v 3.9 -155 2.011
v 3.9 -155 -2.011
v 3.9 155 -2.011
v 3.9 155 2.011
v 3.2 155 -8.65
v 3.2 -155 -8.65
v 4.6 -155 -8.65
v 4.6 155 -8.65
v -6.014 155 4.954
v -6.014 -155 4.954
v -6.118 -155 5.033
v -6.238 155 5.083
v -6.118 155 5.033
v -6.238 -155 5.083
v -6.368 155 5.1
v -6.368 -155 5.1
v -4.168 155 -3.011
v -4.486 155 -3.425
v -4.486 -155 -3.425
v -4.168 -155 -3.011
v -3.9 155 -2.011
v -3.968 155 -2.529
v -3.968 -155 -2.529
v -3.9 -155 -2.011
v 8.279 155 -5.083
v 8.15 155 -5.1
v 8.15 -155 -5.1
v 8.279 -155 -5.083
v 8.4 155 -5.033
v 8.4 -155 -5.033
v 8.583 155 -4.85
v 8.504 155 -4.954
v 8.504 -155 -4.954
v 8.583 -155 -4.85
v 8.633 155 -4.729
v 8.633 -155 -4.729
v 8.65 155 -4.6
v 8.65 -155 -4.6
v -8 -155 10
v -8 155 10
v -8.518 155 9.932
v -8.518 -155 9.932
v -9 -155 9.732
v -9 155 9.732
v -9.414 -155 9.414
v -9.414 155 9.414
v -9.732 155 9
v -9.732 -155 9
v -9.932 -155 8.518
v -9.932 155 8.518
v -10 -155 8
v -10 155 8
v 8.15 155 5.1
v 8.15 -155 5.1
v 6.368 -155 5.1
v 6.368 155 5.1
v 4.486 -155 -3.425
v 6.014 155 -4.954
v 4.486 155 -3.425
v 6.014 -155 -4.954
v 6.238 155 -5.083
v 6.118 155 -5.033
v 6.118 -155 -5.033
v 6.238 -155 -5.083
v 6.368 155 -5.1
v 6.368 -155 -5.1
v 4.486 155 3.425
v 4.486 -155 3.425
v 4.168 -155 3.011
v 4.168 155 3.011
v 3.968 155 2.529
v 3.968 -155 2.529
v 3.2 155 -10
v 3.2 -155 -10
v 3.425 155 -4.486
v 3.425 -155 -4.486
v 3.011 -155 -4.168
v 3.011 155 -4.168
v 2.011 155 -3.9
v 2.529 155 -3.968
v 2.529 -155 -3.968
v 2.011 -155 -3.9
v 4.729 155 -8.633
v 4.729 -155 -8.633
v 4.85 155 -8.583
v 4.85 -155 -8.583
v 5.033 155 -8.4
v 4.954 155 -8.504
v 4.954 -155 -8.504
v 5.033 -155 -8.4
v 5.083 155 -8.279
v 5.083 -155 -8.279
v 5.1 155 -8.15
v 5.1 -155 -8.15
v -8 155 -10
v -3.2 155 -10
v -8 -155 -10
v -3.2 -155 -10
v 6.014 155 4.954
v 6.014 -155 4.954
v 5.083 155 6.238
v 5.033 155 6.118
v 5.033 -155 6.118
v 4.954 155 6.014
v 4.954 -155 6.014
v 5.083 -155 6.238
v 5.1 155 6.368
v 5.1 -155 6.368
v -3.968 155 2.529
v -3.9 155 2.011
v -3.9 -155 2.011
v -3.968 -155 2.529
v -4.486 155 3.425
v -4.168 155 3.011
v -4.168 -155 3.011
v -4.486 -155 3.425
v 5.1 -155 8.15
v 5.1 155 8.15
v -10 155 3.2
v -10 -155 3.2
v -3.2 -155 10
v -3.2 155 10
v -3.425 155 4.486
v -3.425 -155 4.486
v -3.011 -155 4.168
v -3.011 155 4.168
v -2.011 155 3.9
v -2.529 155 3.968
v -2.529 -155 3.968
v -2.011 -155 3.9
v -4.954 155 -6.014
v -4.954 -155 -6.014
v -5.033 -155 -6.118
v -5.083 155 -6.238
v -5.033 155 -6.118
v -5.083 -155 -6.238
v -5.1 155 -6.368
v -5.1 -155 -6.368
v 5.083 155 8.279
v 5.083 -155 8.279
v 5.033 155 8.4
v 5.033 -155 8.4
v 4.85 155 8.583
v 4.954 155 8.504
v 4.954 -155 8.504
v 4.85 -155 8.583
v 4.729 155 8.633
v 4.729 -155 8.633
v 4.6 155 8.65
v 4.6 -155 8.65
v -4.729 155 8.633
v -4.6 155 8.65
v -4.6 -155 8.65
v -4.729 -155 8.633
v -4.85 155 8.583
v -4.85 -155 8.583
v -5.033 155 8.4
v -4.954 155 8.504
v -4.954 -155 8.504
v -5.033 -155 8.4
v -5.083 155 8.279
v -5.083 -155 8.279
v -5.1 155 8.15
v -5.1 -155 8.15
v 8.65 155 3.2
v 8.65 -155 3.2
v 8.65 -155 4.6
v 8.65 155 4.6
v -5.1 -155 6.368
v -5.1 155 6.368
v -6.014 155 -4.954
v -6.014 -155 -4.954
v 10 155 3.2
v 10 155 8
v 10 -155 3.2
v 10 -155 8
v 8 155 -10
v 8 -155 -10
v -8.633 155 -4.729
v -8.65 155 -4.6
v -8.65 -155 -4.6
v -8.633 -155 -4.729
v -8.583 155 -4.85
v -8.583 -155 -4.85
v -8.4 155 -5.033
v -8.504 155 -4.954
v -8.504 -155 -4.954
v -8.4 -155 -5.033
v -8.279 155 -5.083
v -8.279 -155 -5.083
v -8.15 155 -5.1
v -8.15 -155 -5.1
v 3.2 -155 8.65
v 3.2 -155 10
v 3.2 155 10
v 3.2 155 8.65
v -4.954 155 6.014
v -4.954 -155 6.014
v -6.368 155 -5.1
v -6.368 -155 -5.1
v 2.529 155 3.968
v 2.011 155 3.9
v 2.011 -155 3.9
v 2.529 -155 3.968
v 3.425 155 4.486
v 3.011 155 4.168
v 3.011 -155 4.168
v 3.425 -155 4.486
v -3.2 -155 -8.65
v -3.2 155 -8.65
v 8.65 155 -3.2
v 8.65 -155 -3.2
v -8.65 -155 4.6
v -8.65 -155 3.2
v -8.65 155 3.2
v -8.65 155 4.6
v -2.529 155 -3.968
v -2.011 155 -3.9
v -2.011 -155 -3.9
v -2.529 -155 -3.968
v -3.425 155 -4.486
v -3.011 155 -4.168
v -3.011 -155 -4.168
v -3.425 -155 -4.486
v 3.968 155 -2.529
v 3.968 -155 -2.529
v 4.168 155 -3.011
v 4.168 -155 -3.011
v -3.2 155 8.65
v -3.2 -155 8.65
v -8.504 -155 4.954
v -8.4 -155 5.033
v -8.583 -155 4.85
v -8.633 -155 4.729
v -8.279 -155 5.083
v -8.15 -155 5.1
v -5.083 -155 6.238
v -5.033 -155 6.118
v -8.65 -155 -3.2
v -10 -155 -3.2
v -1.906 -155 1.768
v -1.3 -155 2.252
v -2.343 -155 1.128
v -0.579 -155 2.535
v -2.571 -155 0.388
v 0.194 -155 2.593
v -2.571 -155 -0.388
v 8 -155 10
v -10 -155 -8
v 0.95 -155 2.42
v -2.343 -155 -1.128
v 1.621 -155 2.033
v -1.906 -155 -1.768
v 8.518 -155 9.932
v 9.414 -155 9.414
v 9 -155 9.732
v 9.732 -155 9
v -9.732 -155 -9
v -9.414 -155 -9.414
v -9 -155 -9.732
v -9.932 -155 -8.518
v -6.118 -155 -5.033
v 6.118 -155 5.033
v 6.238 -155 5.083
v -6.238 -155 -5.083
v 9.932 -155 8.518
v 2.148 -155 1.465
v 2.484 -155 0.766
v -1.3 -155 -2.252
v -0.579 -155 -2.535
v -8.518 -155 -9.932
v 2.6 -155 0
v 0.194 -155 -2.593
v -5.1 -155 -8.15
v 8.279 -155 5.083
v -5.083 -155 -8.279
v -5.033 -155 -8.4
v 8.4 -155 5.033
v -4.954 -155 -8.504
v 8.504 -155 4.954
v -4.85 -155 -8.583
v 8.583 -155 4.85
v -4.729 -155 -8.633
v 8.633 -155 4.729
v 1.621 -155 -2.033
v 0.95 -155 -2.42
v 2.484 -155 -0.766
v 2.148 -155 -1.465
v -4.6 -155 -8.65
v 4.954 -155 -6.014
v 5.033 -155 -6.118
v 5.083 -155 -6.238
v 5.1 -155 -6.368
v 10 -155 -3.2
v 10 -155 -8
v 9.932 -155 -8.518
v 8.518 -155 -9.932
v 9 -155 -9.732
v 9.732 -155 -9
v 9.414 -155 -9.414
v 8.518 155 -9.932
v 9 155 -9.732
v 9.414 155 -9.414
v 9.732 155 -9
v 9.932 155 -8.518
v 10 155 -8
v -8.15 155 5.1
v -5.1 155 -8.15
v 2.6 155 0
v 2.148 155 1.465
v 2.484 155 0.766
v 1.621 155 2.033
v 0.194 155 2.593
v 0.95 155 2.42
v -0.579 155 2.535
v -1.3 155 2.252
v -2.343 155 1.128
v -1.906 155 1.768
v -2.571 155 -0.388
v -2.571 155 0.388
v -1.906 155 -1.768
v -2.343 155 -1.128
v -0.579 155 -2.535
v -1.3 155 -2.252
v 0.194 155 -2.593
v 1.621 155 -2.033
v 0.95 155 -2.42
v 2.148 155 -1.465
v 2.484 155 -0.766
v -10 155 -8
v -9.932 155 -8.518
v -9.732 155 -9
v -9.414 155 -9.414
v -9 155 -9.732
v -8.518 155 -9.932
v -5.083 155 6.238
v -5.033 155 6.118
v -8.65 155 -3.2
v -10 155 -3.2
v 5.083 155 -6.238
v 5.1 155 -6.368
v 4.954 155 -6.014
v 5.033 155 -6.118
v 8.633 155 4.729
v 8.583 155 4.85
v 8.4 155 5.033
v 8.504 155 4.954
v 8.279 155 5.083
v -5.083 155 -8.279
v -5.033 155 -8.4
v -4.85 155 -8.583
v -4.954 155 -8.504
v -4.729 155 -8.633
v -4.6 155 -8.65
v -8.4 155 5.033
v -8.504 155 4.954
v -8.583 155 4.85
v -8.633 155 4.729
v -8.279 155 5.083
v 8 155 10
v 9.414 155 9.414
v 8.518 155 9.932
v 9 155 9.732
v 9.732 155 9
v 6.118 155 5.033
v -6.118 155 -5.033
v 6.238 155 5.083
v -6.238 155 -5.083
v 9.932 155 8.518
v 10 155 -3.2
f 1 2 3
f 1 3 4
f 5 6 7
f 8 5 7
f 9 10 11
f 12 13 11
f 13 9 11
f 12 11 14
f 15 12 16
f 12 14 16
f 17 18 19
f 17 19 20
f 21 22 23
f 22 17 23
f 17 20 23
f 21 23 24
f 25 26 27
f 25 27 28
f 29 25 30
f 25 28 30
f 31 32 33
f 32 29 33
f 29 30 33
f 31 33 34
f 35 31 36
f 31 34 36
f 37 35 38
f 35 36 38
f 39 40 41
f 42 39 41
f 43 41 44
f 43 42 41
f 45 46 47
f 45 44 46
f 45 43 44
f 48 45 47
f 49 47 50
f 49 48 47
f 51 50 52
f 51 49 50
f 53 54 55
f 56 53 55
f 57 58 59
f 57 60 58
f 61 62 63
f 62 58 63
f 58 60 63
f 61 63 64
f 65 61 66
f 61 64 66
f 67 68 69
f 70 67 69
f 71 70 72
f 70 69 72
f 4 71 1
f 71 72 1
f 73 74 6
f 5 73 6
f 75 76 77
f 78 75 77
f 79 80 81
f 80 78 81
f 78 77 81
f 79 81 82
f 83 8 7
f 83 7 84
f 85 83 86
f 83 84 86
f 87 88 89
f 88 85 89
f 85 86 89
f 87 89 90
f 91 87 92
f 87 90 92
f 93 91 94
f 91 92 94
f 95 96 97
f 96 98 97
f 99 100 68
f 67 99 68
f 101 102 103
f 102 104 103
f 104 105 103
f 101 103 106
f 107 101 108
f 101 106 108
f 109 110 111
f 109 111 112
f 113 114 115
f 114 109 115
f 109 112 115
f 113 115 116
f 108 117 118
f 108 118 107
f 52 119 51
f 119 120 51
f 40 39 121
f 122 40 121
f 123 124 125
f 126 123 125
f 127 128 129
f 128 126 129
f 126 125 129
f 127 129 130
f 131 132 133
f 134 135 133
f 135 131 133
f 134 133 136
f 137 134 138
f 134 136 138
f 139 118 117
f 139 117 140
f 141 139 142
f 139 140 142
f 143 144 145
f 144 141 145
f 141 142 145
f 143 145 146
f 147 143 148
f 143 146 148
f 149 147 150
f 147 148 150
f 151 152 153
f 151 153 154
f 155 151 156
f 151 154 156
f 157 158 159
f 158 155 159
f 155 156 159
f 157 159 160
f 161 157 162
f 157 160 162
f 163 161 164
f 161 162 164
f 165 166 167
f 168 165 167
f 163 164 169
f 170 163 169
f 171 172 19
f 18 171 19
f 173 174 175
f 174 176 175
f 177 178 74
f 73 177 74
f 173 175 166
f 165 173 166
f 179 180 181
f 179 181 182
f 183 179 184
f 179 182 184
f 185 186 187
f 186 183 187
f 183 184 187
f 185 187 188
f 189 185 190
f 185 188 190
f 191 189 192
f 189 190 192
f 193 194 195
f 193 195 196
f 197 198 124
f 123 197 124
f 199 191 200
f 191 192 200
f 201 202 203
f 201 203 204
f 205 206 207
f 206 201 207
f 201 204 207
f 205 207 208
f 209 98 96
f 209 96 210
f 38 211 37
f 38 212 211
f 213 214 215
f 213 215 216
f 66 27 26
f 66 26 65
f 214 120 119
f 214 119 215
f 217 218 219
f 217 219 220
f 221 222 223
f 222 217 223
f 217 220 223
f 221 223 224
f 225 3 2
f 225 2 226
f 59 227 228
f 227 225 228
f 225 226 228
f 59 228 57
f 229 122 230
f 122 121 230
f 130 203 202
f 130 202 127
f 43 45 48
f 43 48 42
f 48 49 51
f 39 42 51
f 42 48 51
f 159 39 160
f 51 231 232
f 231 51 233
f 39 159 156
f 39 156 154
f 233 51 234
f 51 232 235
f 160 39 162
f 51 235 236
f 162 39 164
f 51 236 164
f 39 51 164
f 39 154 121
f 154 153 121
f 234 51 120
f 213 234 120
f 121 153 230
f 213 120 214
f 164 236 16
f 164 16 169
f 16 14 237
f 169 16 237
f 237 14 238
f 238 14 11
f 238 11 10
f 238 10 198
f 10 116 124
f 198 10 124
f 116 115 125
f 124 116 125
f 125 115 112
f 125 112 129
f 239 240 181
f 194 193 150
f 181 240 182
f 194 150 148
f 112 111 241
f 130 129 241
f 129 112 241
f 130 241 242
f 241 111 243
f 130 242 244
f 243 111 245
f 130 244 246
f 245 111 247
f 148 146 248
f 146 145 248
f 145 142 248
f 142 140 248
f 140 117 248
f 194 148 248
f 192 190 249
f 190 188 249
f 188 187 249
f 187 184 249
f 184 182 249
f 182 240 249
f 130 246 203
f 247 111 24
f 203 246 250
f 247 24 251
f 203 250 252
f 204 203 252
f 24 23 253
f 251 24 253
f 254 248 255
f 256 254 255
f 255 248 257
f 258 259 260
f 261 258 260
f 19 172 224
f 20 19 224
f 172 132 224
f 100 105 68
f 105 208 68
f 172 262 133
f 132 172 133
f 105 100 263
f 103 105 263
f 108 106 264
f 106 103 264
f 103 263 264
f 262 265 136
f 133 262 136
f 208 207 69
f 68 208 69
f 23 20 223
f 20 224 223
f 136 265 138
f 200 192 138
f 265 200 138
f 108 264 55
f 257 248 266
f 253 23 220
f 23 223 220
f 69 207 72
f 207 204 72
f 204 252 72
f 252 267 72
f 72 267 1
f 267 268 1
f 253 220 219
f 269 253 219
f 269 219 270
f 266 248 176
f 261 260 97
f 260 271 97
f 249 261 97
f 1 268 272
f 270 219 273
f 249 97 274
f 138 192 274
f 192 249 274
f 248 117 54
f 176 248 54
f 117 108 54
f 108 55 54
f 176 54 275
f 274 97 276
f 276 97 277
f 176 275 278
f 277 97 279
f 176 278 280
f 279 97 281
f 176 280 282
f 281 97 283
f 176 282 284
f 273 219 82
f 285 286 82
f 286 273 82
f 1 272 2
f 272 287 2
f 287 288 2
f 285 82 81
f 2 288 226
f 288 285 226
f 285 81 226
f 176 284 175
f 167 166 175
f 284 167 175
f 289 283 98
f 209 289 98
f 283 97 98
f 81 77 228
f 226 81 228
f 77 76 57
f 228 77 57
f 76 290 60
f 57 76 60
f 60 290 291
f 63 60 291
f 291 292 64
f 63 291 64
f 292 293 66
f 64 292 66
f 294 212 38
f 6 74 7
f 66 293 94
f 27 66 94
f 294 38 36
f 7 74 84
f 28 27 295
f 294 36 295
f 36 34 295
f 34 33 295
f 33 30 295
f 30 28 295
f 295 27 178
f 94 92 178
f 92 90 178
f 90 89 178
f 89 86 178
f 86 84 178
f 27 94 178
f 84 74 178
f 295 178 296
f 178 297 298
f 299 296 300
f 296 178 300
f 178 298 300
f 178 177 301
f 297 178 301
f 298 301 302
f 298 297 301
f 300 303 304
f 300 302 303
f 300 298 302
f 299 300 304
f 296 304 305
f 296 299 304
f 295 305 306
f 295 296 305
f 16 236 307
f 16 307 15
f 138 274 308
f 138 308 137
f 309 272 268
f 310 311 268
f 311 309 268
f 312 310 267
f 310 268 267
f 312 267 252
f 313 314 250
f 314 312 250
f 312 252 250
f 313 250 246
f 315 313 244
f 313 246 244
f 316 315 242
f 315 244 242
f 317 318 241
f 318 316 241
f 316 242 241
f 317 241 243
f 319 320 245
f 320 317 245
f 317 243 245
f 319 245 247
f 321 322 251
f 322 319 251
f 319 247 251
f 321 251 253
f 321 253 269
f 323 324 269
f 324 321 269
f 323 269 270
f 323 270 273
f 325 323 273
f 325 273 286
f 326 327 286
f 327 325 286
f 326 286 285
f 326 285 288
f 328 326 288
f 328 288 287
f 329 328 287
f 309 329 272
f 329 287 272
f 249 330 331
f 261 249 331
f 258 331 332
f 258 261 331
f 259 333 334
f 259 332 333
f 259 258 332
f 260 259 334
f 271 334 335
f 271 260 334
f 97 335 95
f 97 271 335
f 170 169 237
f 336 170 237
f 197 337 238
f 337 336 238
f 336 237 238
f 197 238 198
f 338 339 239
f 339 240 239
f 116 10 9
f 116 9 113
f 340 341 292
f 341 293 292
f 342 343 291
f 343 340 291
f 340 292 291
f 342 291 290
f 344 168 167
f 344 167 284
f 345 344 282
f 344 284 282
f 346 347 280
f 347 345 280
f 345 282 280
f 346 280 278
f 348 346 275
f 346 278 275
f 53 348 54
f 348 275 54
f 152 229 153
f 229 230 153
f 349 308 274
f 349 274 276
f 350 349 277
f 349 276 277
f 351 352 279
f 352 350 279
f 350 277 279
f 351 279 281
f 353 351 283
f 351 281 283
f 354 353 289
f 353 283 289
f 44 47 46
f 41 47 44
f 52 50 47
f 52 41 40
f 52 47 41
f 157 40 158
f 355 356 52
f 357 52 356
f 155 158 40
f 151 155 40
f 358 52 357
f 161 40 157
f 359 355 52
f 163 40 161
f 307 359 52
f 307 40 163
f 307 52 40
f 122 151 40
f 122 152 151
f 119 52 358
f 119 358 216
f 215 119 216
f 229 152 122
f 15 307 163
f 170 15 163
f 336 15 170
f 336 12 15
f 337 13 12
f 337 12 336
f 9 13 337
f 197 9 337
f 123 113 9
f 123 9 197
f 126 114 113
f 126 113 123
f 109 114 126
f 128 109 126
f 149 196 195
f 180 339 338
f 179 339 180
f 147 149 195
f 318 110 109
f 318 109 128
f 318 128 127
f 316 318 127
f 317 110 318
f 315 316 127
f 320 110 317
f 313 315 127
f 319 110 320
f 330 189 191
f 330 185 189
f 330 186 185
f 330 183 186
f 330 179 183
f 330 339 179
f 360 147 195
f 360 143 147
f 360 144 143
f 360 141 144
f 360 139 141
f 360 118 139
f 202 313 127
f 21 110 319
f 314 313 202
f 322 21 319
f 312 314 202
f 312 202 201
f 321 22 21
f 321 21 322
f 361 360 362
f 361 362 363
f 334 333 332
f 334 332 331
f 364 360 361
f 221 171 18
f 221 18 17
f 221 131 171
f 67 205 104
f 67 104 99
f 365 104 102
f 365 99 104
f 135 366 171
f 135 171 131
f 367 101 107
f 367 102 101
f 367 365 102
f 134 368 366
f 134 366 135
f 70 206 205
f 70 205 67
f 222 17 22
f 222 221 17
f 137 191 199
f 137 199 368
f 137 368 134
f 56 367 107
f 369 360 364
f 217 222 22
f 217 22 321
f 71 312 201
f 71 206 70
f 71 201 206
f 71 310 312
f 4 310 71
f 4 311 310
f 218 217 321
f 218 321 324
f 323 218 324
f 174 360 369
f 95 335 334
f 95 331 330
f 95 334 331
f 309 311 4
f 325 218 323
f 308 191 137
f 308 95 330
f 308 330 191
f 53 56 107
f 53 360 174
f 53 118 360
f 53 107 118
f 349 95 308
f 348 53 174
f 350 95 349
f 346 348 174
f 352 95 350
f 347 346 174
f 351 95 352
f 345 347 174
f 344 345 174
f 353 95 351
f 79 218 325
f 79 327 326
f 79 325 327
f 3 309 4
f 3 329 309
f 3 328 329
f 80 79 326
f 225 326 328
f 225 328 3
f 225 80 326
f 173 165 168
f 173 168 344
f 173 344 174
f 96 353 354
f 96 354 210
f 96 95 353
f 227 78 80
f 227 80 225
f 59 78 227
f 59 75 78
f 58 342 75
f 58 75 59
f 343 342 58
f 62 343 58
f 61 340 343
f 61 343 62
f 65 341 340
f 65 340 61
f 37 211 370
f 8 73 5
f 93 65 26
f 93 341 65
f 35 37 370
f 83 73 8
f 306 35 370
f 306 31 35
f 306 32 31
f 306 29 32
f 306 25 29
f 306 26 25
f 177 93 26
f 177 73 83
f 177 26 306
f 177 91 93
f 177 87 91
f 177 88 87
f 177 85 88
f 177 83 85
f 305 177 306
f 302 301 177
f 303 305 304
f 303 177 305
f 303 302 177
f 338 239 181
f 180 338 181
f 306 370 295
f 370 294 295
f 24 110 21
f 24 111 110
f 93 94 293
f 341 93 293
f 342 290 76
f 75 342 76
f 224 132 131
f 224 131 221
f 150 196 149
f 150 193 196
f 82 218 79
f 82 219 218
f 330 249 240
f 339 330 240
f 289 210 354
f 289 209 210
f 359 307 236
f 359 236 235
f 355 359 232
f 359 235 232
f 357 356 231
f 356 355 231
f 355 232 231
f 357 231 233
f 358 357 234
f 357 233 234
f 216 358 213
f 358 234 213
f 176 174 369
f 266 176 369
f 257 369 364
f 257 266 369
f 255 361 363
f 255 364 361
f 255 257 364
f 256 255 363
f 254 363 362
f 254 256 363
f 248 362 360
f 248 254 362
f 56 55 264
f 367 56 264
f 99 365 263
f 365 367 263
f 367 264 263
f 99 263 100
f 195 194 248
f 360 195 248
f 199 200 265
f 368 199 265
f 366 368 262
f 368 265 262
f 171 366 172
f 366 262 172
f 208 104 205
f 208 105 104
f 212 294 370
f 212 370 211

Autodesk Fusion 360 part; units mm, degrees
sketch "スケッチ1" plane through (0, 0, 0) normal (0, 1, 0) x (1, 0, 0)
  line L0 (8, 10) -> (-8, 10)
  line L1 (-10, 8) -> (-10, -8)
  line L2 (-8, -10) -> (8, -10)
  line L3 (10, -8) -> (10, 8)
  line L4 (10, 10) -> (-10, -10) construction
  line L5 (-10, 10) -> (10, -10) construction
  circle A0 centre (0, 0) radius 2.6
  line L6 (-3.2, -10) -> (-3.2, -8.65)
  line L7 (-3.2, -8.65) -> (-4.6, -8.65)
  line L8 (-5.1, -8.15) -> (-5.1, -6.3678)
  line L9 (-4.9536, -6.0142) -> (-3.4251, -4.4858)
  line L10 (0, 0) -> (0, -10) construction
  line L11 (-2.0109, -3.9) -> (0, -3.9)
  arc A1 (-5.1, -8.15) -> (-4.6, -8.65) centre (-4.6, -8.15) ccw
  arc A2 (-4.9536, -6.0142) -> (-5.1, -6.3678) centre (-4.6, -6.3678) ccw
  arc A3 (-2.0109, -3.9) -> (-3.4251, -4.4858) centre (-2.0109, -5.9) ccw
  arc A4 (-10, -8) -> (-8, -10) centre (-8, -8) ccw
  arc A5 (10, 8) -> (8, 10) centre (8, 8) ccw
  arc A6 (8, -10) -> (10, -8) centre (8, -8) ccw
  arc A7 (-8, 10) -> (-10, 8) centre (-8, 8) ccw
  line L12 (3.2, -10) -> (3.2, -8.65)
  line L13 (3.2, -8.65) -> (4.6, -8.65)
  arc A8 (4.6, -8.65) -> (5.1, -8.15) centre (4.6, -8.15) ccw
  line L14 (5.1, -8.15) -> (5.1, -6.3678)
  arc A9 (5.1, -6.3678) -> (4.9536, -6.0142) centre (4.6, -6.3678) ccw
  line L15 (4.9536, -6.0142) -> (3.4251, -4.4858)
  arc A10 (3.4251, -4.4858) -> (2.0109, -3.9) centre (2.0109, -5.9) ccw
  line L16 (2.0109, -3.9) -> (0, -3.9)
  line L17 (10, -3.2) -> (8.65, -3.2)
  line L18 (8.65, -3.2) -> (8.65, -4.6)
  arc A11 (8.15, -5.1) -> (8.65, -4.6) centre (8.15, -4.6) ccw
  line L19 (8.15, -5.1) -> (6.3678, -5.1)
  arc A12 (6.0142, -4.9536) -> (6.3678, -5.1) centre (6.3678, -4.6) ccw
  line L20 (6.0142, -4.9536) -> (4.4858, -3.4251)
  arc A13 (3.9, -2.0109) -> (4.4858, -3.4251) centre (5.9, -2.0109) ccw
  line L21 (3.9, -2.0109) -> (3.9, 0)
  line L22 (3.9, 2.0109) -> (3.9, 0)
  arc A14 (4.4858, 3.4251) -> (3.9, 2.0109) centre (5.9, 2.0109) ccw
  line L23 (6.0142, 4.9536) -> (4.4858, 3.4251)
  arc A15 (6.3678, 5.1) -> (6.0142, 4.9536) centre (6.3678, 4.6) ccw
  line L24 (8.15, 5.1) -> (6.3678, 5.1)
  arc A16 (8.65, 4.6) -> (8.15, 5.1) centre (8.15, 4.6) ccw
  line L25 (8.65, 3.2) -> (8.65, 4.6)
  line L26 (10, 3.2) -> (8.65, 3.2)
  line L27 (3.2, 10) -> (3.2, 8.65)
  line L28 (3.2, 8.65) -> (4.6, 8.65)
  arc A17 (5.1, 8.15) -> (4.6, 8.65) centre (4.6, 8.15) ccw
  line L29 (5.1, 8.15) -> (5.1, 6.3678)
  arc A18 (4.9536, 6.0142) -> (5.1, 6.3678) centre (4.6, 6.3678) ccw
  line L30 (4.9536, 6.0142) -> (3.4251, 4.4858)
  arc A19 (2.0109, 3.9) -> (3.4251, 4.4858) centre (2.0109, 5.9) ccw
  line L31 (2.0109, 3.9) -> (0, 3.9)
  line L32 (-2.0109, 3.9) -> (0, 3.9)
  arc A20 (-3.4251, 4.4858) -> (-2.0109, 3.9) centre (-2.0109, 5.9) ccw
  line L33 (-4.9536, 6.0142) -> (-3.4251, 4.4858)
  arc A21 (-5.1, 6.3678) -> (-4.9536, 6.0142) centre (-4.6, 6.3678) ccw
  line L34 (-5.1, 8.15) -> (-5.1, 6.3678)
  arc A22 (-4.6, 8.65) -> (-5.1, 8.15) centre (-4.6, 8.15) ccw
  line L35 (-3.2, 8.65) -> (-4.6, 8.65)
  line L36 (-3.2, 10) -> (-3.2, 8.65)
  line L37 (-10, 3.2) -> (-8.65, 3.2)
  line L38 (-8.65, 3.2) -> (-8.65, 4.6)
  arc A23 (-8.15, 5.1) -> (-8.65, 4.6) centre (-8.15, 4.6) ccw
  line L39 (-8.15, 5.1) -> (-6.3678, 5.1)
  arc A24 (-6.0142, 4.9536) -> (-6.3678, 5.1) centre (-6.3678, 4.6) ccw
  line L40 (-6.0142, 4.9536) -> (-4.4858, 3.4251)
  arc A25 (-3.9, 2.0109) -> (-4.4858, 3.4251) centre (-5.9, 2.0109) ccw
  line L41 (-3.9, 2.0109) -> (-3.9, 0)
  line L42 (-3.9, -2.0109) -> (-3.9, 0)
  arc A26 (-4.4858, -3.4251) -> (-3.9, -2.0109) centre (-5.9, -2.0109) ccw
  line L43 (-6.0142, -4.9536) -> (-4.4858, -3.4251)
  arc A27 (-6.3678, -5.1) -> (-6.0142, -4.9536) centre (-6.3678, -4.6) ccw
  line L44 (-8.15, -5.1) -> (-6.3678, -5.1)
  arc A28 (-8.65, -4.6) -> (-8.15, -5.1) centre (-8.15, -4.6) ccw
  line L45 (-8.65, -3.2) -> (-8.65, -4.6)
  line L46 (-10, -3.2) -> (-8.65, -3.2)
  dimension "d1" = 20
  dimension "d2" = 20
  dimension "d3" = 5.2
  dimension "d4" = 1.35
  dimension "d5" = 3.2
  dimension "d6" = 5.1
  dimension "d7" = 6.1
  dimension "d8" = 0.75
  dimension "d9" = 0.5
  dimension "d10" = 2
  dimension "d11" = 2
  dimension "d12" = 2
  dimension "d13" = 2
  dimension "d14" = 2
  dimension "d16" = 360
extrude "押し出し1" add sketch "スケッチ1" along normal mid plane 310 contours L0 L1 L2 L3 L6 L7 L8 L9 L11 A1 A2 A3 A4 A5 A6 A7 L12 L13 A8 L14 A9 L15 A10 L16 L17 L18 A11 L19 A12 L20 A13 L21 L22 A14 L23 A15 L24 A16 L25 L26 L27 L28 A17 L29 A18 L30 A19 L31 L32 A20 L33 A21 L34 A22 L35 L36 L37 L38 A23 L39 A24 L40 A25 L41 L42 A26 L43 A27 L44 A28 L45 L46
